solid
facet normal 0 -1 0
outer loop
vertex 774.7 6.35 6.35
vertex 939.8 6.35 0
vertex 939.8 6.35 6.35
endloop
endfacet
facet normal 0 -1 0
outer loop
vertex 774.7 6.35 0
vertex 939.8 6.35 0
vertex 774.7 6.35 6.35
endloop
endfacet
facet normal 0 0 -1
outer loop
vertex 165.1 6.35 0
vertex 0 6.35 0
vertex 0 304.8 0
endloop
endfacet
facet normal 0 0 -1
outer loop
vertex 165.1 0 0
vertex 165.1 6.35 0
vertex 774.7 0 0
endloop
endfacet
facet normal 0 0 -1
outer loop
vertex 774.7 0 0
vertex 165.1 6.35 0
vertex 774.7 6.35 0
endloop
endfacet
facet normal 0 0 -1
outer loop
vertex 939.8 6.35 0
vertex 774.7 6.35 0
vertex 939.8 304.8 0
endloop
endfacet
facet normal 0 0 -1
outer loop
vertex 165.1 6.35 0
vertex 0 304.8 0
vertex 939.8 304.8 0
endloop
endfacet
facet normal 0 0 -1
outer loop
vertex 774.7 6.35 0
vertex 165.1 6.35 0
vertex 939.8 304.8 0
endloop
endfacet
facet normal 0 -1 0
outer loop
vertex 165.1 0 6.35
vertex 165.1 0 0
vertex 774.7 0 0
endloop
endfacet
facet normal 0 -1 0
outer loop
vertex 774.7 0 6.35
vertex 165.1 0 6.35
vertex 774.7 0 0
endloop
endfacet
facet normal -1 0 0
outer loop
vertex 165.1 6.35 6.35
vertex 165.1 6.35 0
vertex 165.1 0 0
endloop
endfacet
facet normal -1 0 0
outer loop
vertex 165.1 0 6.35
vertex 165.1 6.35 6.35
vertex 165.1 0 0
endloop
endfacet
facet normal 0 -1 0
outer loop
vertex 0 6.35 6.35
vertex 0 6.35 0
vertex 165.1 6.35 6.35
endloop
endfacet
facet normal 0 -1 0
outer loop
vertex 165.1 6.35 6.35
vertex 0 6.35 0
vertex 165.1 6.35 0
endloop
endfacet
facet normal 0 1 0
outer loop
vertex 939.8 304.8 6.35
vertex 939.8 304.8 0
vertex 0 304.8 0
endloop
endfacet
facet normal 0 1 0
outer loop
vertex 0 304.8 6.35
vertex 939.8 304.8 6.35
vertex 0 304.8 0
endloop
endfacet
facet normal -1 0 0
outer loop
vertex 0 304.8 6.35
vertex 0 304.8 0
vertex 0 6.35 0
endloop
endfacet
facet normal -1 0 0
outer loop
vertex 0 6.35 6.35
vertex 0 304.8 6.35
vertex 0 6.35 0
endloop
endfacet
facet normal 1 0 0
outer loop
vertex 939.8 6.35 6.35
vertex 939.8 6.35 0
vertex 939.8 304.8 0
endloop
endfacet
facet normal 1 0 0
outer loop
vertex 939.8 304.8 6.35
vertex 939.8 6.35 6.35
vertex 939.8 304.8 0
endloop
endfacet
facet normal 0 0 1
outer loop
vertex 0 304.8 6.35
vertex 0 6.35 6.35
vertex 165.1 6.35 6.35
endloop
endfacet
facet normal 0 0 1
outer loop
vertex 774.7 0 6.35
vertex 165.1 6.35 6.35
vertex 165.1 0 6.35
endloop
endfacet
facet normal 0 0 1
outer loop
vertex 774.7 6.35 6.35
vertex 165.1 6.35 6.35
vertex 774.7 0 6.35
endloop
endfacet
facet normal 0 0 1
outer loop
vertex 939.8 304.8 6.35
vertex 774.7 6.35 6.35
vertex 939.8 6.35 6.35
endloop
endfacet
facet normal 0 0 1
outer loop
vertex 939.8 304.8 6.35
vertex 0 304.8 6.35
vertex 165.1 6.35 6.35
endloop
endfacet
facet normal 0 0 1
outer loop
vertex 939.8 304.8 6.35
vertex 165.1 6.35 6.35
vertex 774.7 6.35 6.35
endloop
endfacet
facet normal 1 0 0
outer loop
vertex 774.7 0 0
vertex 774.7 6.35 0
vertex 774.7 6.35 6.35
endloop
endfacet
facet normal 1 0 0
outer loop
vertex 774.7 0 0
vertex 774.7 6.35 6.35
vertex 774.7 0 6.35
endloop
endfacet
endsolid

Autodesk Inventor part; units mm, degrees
ref_plane "YZ Plane" through (0, 0, 0) normal (1, 0, 0) x (0, 1, 0)
ref_plane "XZ Plane" through (0, 0, 0) normal (0, 1, 0) x (-1, 0, 0)
ref_plane "XY Plane" through (0, 0, 0) normal (0, 0, 1) x (1, 0, 0)
sketch "Sketch1" plane through (0, 0, 0) normal (0, 0, 1) x (1, 0, 0)
  line L0 (0, 0) -> (165.1, 0) construction
  line L1 (939.8, 0) -> (939.8, 6.35) construction
  line L2 (939.8, 304.8) -> (0, 304.8)
  line L3 (0, 304.8) -> (0, 6.35)
  line L4 (0, 6.35) -> (165.1, 6.35)
  line L5 (165.1, 6.35) -> (165.1, 0)
  line L6 (939.8, 6.35) -> (774.7, 6.35)
  line L7 (774.7, 6.35) -> (774.7, 0)
  line L8 (0, 6.35) -> (0, 0) construction
  line L9 (165.1, 0) -> (774.7, 0)
  line L10 (774.7, 0) -> (939.8, 0) construction
  line L11 (939.8, 6.35) -> (939.8, 304.8)
  dimension "d0" = 304.8
  dimension "d1" = 939.8
  dimension "d2" = 165.1
  dimension "d3" = 6.35
extrude "Extrusion1" add sketch "Sketch1" along normal blind 6.35
properties part number "electronics board"
